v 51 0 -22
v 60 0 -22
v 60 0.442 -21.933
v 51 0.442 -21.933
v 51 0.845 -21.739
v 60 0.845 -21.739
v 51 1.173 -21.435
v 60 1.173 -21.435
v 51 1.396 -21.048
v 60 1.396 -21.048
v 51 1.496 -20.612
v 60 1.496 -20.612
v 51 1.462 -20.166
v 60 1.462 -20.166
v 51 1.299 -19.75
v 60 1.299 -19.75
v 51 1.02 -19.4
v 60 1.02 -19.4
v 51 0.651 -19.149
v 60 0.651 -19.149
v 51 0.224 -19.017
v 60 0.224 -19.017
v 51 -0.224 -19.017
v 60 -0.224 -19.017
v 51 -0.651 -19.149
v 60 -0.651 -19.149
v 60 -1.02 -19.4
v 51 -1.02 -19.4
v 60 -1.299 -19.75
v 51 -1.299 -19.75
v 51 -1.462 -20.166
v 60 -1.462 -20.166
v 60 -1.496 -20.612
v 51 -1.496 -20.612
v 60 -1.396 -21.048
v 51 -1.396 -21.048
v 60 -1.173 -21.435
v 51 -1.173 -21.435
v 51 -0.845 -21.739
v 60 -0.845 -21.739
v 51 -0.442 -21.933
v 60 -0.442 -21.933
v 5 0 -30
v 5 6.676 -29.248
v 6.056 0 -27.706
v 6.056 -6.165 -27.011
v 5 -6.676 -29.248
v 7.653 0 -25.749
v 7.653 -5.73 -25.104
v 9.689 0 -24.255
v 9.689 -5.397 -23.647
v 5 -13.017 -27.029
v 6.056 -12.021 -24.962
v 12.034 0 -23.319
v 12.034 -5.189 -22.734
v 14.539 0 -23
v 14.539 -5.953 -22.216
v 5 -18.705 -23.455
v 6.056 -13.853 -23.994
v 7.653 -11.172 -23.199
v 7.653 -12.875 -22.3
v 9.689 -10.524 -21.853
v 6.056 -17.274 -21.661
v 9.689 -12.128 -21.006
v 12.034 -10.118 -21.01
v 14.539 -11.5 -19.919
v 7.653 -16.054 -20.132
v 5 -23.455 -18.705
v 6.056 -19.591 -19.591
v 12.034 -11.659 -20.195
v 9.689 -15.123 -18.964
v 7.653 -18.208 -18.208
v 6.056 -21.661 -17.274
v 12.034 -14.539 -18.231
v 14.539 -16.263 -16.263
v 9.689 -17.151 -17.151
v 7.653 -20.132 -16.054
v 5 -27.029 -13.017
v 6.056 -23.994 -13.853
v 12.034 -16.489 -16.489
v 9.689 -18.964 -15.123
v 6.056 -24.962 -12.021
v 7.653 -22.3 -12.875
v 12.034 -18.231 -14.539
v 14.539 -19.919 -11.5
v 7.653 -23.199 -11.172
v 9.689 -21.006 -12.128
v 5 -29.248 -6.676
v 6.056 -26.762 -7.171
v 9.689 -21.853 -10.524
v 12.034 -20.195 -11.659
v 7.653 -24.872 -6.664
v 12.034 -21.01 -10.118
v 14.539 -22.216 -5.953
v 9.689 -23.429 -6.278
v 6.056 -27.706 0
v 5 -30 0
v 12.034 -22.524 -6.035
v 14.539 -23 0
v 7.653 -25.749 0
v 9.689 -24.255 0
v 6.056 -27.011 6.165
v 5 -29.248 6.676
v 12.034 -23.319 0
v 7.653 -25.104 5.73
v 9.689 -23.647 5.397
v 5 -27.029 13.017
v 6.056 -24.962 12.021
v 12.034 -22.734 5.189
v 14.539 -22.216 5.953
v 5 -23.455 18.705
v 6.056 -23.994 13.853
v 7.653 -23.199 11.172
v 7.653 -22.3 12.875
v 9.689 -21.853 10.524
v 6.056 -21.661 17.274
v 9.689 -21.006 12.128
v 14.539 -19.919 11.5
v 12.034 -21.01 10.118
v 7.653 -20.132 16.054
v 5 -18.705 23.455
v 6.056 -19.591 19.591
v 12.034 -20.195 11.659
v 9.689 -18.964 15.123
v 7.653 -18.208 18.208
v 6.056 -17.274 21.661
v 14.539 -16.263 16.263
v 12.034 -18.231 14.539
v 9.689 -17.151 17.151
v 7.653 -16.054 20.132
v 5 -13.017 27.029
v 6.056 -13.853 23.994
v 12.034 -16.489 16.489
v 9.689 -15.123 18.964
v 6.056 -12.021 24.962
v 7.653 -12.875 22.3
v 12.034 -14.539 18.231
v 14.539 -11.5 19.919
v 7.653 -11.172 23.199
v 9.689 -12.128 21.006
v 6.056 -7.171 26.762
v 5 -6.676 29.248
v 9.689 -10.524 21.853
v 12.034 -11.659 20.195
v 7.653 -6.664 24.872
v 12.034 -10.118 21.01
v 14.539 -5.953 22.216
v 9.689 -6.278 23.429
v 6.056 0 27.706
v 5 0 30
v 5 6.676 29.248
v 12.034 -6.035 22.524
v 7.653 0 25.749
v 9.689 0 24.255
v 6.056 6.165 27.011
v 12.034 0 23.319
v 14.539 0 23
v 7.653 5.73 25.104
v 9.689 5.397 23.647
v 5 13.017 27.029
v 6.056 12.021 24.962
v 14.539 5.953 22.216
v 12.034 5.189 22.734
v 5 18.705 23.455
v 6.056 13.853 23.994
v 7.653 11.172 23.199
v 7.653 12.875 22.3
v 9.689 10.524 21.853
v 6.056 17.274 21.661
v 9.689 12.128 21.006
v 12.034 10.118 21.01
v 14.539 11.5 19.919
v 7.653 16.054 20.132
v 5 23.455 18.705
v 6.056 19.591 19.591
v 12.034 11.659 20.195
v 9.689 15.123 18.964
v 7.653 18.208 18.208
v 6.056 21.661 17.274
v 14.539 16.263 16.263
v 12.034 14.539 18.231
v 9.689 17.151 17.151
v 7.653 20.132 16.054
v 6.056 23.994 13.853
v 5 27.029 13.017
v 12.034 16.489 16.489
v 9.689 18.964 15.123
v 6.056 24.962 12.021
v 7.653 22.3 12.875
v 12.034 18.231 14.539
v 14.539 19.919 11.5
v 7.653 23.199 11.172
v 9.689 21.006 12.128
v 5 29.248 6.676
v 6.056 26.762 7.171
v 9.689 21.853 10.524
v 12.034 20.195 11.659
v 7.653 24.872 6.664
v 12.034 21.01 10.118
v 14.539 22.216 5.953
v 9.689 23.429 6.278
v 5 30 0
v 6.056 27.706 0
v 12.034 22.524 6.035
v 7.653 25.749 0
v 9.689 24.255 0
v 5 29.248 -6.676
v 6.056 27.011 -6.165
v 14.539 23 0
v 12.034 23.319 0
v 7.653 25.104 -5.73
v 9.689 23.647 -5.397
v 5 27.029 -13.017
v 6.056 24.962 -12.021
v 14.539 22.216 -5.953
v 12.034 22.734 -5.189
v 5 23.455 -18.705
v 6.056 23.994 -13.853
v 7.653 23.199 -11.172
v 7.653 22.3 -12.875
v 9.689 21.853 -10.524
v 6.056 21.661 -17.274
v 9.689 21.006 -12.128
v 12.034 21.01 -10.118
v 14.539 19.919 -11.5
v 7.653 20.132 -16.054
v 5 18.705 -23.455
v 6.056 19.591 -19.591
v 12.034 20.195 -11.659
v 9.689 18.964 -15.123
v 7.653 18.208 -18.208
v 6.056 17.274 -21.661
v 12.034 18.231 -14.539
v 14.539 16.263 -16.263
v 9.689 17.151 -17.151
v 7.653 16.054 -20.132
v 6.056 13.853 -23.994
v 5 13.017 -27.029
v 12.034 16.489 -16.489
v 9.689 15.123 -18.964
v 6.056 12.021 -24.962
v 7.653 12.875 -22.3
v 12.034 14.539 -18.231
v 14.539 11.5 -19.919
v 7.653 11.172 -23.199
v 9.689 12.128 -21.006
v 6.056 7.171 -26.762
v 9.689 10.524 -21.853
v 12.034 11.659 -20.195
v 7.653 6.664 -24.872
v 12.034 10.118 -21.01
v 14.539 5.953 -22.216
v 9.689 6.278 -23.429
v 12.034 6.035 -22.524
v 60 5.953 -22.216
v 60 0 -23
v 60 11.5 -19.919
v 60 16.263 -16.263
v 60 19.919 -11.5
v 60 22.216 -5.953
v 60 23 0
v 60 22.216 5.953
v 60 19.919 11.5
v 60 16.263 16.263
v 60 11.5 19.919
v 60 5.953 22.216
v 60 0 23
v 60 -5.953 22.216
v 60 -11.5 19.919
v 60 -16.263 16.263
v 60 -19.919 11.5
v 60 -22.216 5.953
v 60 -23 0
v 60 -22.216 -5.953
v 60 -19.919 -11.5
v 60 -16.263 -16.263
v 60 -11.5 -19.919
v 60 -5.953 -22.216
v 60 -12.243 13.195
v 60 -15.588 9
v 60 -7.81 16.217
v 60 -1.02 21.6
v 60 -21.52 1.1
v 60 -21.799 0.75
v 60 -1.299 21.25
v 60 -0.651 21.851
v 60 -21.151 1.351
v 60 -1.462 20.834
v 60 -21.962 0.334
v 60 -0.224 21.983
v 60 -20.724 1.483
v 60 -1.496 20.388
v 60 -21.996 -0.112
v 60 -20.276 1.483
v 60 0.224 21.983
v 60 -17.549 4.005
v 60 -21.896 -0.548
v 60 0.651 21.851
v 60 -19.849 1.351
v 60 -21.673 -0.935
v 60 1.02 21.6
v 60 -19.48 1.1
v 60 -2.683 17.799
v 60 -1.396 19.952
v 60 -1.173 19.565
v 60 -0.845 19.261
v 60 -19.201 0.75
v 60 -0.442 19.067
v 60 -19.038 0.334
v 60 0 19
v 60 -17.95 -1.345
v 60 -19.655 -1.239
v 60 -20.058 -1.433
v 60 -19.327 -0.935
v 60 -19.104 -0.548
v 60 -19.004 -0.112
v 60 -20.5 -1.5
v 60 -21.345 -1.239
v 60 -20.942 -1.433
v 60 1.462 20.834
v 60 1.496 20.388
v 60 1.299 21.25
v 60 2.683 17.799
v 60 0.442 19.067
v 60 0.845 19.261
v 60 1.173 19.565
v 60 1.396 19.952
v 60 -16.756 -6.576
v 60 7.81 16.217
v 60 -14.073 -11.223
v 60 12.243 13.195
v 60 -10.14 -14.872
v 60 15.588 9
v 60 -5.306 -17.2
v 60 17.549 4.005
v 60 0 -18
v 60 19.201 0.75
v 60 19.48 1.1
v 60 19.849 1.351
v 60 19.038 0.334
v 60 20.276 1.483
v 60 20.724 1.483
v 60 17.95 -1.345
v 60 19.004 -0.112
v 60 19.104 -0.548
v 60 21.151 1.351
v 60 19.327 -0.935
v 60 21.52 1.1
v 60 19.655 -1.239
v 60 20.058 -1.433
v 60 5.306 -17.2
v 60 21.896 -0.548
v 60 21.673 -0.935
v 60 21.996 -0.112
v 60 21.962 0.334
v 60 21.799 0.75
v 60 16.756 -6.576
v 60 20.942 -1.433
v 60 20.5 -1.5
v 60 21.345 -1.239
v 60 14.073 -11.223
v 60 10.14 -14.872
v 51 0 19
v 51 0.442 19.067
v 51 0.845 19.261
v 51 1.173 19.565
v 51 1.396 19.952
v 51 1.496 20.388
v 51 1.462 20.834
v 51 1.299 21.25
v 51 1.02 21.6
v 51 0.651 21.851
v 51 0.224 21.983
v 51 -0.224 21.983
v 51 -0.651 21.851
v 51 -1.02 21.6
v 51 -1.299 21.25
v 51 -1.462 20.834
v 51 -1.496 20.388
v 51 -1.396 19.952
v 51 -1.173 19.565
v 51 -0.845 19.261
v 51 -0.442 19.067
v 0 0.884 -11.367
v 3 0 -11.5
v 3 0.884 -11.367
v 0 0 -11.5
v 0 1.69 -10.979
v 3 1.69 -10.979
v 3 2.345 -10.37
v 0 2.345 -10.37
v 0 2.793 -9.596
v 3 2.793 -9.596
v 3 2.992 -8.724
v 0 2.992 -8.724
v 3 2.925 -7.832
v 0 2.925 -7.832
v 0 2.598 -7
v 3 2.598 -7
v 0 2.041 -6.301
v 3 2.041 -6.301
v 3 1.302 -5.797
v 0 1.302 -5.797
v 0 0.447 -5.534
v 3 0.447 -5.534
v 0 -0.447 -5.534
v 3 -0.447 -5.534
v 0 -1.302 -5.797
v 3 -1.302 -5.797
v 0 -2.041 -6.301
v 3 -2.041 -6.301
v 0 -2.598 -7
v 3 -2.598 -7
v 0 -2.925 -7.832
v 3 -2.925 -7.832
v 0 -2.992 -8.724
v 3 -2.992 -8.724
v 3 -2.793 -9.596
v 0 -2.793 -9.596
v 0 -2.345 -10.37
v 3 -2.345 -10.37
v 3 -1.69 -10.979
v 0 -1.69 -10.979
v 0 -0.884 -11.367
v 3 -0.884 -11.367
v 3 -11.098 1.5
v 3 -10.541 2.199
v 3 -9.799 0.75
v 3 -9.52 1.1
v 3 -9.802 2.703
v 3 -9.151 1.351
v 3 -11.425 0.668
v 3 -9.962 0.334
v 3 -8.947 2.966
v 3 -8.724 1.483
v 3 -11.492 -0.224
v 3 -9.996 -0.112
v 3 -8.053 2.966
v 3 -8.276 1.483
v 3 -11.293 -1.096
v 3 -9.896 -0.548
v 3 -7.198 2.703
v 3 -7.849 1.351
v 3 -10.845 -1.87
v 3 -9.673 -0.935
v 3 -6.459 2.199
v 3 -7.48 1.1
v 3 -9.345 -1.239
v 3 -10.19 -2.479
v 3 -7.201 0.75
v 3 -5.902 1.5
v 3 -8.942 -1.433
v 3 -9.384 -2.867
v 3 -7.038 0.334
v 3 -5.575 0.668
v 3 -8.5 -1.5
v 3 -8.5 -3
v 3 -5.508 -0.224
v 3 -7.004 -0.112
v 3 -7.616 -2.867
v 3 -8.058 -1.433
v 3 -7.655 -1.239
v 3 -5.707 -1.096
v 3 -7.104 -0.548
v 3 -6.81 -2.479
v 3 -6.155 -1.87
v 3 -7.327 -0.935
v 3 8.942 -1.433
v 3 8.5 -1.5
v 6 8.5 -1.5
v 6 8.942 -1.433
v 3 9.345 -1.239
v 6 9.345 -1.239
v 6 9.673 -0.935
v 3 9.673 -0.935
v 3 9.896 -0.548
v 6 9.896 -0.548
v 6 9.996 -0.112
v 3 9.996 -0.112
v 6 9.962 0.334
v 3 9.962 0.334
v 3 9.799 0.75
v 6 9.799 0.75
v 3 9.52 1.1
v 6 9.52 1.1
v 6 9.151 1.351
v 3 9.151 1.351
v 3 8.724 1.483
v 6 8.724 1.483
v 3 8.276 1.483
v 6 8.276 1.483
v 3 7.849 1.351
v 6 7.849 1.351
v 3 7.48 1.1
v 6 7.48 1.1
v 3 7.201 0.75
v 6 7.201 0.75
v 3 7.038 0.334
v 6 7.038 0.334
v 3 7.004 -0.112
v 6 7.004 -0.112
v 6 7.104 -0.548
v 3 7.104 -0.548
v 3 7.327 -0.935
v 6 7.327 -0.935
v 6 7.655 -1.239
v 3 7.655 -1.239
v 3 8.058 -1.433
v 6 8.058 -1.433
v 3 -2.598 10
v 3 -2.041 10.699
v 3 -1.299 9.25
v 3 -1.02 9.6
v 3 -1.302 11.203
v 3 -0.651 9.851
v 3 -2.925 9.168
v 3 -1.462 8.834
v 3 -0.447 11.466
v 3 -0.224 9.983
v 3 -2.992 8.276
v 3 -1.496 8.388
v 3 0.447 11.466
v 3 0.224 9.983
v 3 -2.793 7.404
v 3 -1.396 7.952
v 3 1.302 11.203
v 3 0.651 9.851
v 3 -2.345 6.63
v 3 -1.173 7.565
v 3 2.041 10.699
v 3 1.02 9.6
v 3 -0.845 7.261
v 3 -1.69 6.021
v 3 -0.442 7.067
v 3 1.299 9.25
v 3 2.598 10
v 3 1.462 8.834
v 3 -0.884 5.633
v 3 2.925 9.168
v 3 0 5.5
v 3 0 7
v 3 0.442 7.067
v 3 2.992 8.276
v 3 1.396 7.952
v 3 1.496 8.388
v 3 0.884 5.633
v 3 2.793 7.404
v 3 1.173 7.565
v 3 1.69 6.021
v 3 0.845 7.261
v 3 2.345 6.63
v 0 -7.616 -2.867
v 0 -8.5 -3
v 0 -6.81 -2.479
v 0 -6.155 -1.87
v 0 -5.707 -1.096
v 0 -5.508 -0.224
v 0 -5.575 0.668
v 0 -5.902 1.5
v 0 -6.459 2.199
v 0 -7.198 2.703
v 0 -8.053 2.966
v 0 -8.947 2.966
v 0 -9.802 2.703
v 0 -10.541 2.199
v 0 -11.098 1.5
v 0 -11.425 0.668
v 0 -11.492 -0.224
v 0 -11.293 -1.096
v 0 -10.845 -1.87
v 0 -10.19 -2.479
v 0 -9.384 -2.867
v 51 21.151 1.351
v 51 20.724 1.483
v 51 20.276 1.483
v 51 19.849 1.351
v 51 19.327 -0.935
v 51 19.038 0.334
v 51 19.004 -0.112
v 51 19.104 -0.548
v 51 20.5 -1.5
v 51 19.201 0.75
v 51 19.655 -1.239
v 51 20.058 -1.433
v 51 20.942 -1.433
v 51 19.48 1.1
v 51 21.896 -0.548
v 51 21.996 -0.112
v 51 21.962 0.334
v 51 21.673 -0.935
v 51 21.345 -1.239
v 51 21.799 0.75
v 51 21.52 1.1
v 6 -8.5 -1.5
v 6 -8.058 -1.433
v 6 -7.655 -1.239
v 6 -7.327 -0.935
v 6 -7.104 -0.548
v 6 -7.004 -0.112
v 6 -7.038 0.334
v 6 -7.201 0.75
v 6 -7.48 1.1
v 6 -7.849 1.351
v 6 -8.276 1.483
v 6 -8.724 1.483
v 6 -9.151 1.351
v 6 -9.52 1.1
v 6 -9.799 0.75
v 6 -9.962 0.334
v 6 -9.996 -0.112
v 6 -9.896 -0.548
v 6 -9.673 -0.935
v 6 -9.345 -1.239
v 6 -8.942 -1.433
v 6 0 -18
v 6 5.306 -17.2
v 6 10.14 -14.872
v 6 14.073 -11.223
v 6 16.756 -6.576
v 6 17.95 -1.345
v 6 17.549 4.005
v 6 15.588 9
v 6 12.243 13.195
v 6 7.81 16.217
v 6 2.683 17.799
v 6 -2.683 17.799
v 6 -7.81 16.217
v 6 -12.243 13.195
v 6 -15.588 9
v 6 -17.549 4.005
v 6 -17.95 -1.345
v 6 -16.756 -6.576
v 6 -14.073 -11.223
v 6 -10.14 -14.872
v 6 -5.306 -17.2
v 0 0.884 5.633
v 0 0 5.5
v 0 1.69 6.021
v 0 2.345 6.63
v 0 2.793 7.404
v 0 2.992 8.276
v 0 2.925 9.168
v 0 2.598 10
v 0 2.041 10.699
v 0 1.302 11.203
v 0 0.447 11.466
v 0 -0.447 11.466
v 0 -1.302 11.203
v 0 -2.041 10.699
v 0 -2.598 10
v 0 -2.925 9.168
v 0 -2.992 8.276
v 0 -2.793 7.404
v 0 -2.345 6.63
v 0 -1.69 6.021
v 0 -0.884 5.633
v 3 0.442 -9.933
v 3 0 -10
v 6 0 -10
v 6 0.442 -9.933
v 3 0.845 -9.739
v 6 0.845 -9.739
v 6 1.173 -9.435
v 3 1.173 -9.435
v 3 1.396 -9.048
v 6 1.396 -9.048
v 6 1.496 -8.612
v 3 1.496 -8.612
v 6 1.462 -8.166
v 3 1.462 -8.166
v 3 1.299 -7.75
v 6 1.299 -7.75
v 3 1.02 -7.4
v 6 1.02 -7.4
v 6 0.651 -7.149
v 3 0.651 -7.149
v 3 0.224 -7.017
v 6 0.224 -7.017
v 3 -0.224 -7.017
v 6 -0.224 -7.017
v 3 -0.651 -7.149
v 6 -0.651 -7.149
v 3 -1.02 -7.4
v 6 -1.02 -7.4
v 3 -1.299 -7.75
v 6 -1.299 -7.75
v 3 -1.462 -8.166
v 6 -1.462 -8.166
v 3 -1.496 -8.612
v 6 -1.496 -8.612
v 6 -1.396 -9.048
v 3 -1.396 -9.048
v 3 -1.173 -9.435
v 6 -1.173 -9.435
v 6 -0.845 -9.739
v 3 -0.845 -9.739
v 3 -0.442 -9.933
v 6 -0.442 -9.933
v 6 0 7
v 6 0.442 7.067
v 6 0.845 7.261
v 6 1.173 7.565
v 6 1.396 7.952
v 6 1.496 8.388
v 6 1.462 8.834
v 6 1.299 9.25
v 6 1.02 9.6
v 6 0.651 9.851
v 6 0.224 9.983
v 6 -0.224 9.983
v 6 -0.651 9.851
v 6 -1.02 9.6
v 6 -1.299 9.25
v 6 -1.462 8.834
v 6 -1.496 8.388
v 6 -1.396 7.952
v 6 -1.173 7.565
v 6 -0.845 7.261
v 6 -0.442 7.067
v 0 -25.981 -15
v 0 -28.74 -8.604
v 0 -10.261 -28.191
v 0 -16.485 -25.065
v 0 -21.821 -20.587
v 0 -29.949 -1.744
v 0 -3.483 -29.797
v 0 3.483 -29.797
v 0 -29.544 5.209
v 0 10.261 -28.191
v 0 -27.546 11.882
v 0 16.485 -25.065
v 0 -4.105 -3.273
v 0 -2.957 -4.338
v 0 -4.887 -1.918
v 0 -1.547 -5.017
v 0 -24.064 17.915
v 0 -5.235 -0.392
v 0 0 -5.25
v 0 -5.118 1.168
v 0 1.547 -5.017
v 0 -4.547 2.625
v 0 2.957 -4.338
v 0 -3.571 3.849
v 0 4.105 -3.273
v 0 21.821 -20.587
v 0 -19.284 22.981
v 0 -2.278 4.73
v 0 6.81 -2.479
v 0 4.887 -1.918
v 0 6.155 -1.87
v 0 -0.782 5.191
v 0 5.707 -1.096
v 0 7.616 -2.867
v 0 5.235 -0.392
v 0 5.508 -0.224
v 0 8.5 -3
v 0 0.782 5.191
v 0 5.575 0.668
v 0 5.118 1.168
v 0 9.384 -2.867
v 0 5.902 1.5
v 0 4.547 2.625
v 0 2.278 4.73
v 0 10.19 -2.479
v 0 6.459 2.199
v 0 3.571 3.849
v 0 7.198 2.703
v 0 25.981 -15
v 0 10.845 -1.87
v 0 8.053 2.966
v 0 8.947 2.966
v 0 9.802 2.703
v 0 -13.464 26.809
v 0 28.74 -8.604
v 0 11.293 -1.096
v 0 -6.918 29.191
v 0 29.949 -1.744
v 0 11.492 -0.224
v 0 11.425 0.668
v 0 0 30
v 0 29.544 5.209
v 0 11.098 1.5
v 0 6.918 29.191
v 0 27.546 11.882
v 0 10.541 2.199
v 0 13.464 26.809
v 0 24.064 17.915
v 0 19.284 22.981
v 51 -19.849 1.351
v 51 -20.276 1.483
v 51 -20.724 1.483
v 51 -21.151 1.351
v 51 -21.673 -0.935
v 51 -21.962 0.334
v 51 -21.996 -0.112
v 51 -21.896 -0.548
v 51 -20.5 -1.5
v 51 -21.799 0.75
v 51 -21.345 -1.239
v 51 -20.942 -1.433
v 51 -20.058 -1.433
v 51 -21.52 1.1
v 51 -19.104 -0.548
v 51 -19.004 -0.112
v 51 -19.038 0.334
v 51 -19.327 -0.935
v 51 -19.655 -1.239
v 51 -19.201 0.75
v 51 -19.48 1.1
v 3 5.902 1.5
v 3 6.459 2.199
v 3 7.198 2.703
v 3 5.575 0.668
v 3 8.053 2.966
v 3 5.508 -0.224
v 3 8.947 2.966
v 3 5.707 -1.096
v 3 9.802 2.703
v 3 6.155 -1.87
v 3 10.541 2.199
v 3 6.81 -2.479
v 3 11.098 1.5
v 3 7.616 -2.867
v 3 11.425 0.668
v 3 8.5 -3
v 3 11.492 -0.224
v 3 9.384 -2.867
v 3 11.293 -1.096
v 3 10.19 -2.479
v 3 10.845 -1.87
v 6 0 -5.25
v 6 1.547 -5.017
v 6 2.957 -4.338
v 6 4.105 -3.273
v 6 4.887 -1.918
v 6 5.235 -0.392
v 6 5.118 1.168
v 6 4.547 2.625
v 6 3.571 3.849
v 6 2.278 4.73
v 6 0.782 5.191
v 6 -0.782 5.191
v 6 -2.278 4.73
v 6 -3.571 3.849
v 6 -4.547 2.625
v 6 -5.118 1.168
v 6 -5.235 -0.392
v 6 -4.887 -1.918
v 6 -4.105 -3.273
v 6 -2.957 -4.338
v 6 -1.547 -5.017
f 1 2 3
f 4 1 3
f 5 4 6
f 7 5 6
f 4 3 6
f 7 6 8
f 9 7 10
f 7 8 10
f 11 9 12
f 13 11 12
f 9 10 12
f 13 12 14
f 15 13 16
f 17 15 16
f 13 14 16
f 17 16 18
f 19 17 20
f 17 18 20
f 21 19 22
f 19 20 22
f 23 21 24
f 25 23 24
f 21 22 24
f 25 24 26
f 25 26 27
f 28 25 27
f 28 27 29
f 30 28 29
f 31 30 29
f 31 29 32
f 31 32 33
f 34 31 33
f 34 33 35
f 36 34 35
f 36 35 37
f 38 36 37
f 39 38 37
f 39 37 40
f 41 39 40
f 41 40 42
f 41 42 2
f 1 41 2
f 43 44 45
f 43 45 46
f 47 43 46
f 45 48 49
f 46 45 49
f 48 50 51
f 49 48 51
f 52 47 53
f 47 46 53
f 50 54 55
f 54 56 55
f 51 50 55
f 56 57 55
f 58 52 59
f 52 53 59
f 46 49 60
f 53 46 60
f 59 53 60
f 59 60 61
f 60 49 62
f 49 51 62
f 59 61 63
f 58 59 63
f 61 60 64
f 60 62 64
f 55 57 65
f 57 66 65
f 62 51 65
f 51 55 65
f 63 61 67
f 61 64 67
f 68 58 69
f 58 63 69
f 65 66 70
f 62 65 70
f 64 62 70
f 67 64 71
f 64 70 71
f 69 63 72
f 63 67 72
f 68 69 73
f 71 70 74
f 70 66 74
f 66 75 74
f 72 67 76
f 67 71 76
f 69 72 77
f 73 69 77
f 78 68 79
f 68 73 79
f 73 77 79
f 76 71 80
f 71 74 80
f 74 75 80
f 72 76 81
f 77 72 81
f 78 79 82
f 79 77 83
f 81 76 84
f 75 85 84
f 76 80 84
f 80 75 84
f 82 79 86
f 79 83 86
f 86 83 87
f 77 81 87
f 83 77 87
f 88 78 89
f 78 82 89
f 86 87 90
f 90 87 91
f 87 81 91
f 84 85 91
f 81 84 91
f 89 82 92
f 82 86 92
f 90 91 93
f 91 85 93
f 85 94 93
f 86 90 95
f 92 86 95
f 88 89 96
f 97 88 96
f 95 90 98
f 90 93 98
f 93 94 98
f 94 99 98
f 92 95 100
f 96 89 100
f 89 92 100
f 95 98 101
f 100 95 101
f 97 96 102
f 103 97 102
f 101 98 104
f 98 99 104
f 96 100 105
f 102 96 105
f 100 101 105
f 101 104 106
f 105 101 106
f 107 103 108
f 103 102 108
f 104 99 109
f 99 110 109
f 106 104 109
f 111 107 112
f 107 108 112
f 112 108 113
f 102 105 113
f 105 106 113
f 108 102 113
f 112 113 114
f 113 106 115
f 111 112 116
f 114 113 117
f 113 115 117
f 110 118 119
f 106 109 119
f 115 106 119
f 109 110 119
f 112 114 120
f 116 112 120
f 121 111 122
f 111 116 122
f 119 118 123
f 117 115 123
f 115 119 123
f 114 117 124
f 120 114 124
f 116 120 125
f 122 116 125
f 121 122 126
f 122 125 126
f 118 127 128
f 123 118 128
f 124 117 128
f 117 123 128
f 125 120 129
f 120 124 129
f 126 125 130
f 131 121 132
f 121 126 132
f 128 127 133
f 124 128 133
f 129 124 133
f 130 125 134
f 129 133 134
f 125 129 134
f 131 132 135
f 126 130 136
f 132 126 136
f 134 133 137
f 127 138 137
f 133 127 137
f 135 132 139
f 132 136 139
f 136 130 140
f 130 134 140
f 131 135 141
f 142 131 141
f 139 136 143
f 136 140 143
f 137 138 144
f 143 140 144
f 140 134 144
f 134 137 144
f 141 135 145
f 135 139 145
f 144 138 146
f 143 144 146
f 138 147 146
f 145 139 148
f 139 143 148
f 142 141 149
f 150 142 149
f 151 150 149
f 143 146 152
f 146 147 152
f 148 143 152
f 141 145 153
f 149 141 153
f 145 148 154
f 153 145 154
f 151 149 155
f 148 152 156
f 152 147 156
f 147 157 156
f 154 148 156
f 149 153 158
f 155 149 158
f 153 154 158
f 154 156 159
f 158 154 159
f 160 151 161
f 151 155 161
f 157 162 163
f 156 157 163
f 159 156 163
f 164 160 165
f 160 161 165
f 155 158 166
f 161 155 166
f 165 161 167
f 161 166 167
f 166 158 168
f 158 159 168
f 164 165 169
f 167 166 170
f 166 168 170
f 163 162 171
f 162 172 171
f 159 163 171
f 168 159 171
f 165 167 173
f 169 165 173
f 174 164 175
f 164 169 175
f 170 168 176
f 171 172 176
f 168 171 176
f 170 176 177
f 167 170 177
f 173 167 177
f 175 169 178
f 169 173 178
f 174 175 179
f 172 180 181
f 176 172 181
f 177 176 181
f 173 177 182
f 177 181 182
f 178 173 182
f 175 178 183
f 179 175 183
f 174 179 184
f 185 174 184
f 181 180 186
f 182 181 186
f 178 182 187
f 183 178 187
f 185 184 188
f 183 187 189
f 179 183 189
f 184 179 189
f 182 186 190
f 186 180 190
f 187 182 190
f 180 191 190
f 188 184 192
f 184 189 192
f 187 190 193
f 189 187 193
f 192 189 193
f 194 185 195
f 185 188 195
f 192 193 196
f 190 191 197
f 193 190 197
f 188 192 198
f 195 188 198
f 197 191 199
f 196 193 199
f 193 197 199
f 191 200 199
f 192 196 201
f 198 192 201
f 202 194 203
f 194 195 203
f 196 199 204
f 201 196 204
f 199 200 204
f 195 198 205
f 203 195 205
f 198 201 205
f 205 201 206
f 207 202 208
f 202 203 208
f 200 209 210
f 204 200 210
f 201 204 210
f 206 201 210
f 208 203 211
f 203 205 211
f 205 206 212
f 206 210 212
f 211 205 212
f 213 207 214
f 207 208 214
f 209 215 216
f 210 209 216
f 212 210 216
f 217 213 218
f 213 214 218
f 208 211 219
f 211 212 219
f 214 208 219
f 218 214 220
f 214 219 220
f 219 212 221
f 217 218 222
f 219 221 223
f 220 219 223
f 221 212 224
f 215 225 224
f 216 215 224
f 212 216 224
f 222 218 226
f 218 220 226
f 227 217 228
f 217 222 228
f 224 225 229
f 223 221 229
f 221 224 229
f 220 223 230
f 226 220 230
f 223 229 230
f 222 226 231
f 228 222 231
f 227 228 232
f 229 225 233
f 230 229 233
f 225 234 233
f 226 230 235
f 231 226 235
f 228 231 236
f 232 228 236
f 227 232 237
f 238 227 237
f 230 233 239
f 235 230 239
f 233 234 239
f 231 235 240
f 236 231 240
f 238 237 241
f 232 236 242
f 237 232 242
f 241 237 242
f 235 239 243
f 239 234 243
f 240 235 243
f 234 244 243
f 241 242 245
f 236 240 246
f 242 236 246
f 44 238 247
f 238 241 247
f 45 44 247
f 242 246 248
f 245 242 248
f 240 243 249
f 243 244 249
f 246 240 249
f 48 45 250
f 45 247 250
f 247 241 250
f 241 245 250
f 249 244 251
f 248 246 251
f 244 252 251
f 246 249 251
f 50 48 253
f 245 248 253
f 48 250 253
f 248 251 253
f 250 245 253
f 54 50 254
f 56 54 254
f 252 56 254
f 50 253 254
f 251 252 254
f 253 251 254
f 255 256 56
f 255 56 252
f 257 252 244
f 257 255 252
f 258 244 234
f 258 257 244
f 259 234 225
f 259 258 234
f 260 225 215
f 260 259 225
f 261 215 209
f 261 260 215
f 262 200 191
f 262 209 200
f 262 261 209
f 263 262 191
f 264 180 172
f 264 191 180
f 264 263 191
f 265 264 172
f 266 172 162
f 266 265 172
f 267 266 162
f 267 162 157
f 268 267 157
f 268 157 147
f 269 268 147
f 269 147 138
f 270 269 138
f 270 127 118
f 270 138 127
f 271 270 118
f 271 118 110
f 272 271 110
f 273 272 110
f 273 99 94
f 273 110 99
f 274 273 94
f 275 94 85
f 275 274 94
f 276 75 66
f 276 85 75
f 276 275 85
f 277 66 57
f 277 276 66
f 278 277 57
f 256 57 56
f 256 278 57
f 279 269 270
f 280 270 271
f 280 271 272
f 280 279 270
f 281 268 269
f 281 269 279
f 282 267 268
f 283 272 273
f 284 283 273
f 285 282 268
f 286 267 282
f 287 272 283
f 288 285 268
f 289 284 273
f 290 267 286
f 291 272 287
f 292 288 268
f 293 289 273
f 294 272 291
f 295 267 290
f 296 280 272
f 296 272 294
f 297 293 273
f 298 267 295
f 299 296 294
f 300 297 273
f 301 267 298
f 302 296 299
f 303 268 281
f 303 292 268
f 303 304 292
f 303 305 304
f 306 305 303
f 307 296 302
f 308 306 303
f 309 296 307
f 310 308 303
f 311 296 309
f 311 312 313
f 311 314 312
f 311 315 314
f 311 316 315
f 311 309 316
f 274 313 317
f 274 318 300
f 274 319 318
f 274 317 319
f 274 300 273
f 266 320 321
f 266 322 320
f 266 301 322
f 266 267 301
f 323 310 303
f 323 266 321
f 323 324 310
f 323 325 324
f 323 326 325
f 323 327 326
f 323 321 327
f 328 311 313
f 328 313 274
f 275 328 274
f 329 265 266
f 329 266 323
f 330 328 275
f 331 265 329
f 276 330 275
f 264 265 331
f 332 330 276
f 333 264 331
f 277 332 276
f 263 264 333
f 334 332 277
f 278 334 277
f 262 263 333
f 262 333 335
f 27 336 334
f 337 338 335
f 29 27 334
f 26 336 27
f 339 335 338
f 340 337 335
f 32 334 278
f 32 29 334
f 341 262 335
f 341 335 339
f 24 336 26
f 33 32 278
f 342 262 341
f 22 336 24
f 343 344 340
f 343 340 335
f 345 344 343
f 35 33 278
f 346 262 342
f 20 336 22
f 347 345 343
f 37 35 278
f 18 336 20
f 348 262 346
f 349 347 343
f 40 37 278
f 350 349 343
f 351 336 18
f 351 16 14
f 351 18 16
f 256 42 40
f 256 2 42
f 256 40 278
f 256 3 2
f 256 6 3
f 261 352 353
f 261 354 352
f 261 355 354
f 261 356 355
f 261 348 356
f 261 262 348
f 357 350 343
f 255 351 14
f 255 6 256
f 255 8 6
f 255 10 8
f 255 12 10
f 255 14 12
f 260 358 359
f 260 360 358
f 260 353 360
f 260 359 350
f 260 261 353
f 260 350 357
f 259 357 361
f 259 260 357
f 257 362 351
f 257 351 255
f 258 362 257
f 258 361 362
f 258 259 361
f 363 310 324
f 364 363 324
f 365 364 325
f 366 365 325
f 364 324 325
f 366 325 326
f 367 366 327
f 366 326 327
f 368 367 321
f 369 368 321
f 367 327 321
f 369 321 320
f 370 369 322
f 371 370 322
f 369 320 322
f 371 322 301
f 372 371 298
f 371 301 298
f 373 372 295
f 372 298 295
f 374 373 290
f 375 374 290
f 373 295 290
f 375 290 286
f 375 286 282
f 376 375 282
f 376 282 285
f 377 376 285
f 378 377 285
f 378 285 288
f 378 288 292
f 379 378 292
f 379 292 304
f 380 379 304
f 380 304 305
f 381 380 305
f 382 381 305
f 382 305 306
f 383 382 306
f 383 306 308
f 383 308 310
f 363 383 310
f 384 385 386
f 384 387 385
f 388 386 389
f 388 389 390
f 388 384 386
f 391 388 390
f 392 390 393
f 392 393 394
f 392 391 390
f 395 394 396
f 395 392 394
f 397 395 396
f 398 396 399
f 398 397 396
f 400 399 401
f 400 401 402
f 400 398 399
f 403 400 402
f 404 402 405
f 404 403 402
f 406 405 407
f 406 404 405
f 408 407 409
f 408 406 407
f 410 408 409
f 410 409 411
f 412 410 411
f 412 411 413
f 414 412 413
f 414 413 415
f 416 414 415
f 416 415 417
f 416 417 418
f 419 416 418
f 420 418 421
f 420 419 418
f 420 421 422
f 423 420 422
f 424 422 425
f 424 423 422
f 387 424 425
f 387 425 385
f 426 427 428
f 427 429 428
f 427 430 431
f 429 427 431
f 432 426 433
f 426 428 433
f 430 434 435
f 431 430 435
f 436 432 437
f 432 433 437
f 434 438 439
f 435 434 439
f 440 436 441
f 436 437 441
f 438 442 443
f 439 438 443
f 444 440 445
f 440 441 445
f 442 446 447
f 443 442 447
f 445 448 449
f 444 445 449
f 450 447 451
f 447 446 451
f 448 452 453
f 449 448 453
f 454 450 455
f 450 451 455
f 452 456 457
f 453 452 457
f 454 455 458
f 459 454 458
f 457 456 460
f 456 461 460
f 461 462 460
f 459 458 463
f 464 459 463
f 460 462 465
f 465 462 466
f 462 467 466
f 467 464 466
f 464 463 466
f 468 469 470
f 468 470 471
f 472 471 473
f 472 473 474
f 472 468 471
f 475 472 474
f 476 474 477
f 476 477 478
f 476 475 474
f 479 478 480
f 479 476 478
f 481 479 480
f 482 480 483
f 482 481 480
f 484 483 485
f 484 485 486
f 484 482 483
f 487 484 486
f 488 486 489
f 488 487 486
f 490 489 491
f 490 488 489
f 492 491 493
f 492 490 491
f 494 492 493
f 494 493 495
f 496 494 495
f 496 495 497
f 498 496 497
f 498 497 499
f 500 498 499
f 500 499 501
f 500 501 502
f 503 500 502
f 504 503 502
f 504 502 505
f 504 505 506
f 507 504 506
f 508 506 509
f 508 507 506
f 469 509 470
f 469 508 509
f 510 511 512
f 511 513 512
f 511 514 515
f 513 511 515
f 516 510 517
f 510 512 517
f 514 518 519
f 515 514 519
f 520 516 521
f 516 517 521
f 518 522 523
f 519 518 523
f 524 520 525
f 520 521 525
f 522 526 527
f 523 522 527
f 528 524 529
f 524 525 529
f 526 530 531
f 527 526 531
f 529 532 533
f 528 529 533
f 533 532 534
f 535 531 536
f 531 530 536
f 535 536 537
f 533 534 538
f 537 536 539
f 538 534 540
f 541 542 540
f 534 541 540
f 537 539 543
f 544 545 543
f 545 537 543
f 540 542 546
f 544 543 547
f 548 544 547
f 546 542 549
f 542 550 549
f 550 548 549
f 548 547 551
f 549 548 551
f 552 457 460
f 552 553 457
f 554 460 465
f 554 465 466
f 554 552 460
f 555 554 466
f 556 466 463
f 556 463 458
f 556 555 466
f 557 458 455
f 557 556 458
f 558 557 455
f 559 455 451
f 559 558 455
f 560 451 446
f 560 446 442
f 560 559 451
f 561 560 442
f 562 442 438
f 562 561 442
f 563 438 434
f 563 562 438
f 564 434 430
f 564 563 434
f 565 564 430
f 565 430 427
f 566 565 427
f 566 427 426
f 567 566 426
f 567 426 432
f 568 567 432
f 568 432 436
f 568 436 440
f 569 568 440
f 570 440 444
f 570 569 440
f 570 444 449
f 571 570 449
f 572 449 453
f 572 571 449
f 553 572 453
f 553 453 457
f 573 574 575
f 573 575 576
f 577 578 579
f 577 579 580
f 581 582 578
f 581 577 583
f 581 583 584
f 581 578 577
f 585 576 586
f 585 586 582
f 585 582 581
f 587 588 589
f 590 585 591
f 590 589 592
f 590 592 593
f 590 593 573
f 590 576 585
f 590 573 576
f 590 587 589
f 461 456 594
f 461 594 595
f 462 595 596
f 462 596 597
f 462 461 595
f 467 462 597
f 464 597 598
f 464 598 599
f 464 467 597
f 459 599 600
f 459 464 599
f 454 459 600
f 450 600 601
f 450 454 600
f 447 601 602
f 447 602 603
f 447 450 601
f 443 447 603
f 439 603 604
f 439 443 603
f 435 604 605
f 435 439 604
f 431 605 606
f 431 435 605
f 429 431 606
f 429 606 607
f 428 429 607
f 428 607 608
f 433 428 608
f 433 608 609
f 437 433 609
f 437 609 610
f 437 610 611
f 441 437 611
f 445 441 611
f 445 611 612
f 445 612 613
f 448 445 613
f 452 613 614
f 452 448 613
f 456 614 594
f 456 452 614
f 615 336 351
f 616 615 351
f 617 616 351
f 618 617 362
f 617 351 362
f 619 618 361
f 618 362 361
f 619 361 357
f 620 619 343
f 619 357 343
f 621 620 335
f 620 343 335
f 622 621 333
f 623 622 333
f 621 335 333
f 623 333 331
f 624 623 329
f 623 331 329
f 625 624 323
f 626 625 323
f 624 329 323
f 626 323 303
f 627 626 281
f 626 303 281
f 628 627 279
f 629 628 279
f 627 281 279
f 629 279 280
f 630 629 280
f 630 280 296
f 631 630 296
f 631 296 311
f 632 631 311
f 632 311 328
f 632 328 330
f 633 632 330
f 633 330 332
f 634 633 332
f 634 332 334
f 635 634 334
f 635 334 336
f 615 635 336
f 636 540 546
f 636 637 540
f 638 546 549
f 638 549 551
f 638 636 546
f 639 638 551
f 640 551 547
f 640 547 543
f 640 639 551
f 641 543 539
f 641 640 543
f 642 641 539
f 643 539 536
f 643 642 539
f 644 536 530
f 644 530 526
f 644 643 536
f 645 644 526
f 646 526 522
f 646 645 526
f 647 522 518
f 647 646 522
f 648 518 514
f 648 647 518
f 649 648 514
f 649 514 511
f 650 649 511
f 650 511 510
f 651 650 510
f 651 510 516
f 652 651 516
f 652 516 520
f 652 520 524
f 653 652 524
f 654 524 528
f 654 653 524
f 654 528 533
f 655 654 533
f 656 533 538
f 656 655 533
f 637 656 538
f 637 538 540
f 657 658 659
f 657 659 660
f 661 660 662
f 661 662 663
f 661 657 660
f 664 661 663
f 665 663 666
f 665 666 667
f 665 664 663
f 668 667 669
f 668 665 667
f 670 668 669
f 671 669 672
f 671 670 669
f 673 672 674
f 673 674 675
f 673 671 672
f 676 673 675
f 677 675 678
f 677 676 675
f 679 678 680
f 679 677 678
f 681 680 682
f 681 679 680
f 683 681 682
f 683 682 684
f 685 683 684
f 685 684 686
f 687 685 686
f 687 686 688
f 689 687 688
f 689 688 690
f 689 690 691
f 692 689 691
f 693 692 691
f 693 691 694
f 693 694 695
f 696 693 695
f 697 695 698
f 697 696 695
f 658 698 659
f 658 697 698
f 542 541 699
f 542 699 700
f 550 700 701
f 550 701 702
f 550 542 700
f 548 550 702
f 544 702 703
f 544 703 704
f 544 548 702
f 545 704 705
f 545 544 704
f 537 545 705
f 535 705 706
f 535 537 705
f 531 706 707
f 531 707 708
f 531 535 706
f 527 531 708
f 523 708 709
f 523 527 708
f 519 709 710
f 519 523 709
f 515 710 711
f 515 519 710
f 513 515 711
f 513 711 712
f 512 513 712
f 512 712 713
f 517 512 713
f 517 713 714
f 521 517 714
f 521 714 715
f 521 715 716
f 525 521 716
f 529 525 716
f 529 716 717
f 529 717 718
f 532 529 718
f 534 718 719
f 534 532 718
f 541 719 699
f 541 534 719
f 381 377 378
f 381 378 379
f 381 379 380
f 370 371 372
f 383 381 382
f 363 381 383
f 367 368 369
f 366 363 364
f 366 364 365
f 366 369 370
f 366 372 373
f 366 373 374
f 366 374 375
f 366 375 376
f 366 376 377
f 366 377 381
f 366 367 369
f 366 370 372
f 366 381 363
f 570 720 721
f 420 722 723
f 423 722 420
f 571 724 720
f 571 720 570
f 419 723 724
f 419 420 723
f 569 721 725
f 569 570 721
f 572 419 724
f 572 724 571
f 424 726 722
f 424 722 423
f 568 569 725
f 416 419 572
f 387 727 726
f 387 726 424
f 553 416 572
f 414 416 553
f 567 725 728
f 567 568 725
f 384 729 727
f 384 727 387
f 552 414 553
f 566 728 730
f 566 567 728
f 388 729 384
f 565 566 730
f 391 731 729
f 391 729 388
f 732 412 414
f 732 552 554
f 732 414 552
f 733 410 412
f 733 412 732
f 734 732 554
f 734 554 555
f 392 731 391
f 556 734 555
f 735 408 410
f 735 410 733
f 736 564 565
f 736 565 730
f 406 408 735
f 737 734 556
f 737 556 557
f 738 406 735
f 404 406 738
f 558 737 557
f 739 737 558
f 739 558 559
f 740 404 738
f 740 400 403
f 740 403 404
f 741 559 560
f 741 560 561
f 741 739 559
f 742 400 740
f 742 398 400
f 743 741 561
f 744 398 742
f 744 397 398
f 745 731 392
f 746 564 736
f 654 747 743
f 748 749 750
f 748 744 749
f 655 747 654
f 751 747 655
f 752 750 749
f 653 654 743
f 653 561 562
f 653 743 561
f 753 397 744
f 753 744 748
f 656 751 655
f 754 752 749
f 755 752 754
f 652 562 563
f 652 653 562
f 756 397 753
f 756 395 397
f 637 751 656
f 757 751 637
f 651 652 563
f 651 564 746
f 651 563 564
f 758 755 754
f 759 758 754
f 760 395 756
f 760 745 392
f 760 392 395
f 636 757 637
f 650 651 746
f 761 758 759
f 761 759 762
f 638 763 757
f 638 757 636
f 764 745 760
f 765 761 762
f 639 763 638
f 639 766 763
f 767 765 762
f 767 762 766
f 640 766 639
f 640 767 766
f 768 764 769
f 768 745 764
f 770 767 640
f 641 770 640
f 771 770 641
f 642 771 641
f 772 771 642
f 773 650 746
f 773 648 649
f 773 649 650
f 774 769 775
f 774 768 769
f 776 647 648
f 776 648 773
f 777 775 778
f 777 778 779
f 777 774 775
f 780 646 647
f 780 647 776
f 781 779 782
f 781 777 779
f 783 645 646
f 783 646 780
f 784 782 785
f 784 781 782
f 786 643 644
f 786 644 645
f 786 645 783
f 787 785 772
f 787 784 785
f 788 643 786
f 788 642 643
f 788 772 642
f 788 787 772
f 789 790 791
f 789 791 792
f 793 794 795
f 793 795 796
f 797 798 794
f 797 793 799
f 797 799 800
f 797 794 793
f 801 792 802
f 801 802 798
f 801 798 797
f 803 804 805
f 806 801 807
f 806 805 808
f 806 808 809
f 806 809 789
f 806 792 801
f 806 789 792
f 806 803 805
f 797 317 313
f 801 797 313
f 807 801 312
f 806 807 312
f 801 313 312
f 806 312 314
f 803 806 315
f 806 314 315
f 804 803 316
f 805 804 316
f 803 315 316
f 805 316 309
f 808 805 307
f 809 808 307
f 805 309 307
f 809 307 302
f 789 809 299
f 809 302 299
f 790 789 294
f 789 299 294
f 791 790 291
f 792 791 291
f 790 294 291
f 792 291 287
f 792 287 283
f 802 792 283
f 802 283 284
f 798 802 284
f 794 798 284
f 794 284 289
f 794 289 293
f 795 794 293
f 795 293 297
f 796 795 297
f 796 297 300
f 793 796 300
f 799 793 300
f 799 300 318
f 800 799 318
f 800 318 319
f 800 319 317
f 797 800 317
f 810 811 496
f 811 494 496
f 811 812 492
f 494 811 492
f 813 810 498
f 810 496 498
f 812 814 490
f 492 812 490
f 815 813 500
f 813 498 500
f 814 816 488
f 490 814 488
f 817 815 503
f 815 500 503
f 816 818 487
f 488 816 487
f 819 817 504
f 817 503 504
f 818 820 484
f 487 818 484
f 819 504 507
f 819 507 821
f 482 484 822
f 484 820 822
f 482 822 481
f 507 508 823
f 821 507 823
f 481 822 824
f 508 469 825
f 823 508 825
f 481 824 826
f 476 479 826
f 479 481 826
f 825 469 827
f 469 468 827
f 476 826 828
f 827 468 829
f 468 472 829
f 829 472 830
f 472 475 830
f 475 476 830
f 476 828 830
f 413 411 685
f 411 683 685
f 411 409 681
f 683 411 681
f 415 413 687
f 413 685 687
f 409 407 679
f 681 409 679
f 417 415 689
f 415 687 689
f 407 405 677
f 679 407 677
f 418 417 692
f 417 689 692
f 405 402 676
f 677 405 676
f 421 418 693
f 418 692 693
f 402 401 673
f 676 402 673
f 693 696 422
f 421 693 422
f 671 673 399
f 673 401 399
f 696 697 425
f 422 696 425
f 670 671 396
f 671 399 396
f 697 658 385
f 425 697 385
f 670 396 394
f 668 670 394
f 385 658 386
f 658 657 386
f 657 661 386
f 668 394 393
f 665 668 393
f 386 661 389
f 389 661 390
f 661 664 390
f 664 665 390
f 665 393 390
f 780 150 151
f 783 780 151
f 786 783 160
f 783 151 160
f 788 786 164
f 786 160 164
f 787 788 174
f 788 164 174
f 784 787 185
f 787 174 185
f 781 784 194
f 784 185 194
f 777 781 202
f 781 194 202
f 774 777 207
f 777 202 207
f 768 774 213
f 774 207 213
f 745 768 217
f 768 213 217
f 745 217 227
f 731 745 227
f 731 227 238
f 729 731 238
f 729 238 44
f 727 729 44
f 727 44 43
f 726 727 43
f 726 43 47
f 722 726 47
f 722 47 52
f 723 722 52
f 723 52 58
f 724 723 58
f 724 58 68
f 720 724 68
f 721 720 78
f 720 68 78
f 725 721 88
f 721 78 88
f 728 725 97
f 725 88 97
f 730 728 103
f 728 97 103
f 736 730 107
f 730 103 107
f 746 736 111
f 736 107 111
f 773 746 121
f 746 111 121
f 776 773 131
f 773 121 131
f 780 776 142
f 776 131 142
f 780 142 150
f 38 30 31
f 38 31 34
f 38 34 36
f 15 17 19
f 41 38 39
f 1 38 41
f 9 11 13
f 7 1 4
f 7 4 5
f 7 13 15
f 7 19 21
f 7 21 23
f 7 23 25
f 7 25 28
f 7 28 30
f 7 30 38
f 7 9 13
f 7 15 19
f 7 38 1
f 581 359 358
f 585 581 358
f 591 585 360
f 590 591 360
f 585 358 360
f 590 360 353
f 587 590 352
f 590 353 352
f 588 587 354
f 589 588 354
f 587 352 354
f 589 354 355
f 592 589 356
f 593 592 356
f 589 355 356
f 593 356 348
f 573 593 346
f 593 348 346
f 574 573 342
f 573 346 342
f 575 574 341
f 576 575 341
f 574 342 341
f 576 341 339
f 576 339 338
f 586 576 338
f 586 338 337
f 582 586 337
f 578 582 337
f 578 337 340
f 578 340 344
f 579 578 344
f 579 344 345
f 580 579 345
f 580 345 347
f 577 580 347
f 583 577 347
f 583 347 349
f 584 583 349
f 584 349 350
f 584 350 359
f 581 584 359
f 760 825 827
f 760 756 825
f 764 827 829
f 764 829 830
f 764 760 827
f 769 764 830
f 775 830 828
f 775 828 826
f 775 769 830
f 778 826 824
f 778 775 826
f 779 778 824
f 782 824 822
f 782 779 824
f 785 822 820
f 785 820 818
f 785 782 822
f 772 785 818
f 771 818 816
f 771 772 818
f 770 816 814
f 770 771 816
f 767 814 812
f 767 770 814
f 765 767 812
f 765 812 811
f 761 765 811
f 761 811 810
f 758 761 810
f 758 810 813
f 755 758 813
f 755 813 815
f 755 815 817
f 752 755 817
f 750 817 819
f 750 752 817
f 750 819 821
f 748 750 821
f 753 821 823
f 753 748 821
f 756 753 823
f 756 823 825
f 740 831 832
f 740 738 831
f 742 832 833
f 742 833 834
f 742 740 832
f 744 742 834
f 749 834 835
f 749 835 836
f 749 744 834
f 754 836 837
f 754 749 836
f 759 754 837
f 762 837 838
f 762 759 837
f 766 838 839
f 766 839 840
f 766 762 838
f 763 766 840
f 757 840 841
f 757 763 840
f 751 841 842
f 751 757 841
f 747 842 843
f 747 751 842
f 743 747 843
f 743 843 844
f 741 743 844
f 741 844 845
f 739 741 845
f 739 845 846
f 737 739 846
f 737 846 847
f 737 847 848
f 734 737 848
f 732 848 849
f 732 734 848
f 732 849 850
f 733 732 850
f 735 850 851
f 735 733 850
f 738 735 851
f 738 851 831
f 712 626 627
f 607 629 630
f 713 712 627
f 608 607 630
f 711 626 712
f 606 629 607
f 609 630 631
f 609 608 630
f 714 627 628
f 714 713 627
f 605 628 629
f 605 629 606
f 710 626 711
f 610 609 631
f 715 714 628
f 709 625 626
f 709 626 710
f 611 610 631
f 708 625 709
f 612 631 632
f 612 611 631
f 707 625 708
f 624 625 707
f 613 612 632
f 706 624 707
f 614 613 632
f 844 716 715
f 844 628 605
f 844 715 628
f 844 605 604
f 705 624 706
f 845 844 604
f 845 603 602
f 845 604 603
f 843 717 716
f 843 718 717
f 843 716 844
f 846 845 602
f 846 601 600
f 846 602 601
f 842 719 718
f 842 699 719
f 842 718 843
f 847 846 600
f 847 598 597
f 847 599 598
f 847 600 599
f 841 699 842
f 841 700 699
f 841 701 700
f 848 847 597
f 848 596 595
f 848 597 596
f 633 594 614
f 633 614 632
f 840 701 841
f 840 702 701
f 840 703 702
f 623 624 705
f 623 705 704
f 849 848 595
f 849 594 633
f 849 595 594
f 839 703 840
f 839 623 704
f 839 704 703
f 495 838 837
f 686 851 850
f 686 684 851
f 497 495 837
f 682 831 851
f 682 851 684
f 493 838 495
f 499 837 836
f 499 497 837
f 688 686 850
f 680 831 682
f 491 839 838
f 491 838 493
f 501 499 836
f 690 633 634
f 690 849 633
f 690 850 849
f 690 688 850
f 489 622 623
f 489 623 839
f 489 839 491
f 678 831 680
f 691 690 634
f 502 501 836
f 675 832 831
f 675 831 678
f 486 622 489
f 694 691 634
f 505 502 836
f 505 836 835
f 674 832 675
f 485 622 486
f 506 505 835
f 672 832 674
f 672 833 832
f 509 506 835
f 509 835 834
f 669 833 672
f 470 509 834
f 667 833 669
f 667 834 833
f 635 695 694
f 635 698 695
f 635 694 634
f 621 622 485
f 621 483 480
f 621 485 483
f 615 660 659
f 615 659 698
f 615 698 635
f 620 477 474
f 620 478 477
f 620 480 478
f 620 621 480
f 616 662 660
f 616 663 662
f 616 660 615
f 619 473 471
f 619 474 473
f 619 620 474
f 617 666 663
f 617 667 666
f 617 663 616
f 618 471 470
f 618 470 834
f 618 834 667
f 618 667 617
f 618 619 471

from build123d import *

# Parameters (mm, degrees)
SKETCH1_R                 = 23
SKETCH1_R_2               = 18
BOSS_EXTRUDE1_DEPTH       = 11
BOSS_EXTRUDE2_START       = 3
SKETCH1_13_R              = 23
SKETCH1_13_R_2            = 18
SKETCH1_13_R_3            = 3
SKETCH1_13_R_4            = 5.25
BOSS_EXTRUDE2_DEPTH       = 3
BOSS_EXTRUDE4_START       = 3
BOSS_EXTRUDE4_OUTLINE_R   = 23
BOSS_EXTRUDE4_OUTLINE_R_2 = 3
BOSS_EXTRUDE4_OUTLINE_R_3 = 5.25
BOSS_EXTRUDE4_DEPTH       = 3
BOSS_EXTRUDE5_START       = 60
SKETCH1_17_R              = 23
SKETCH1_17_R_2            = 18
BOSS_EXTRUDE5_DEPTH       = 60
SKETCH2_R                 = 1.5
CUT_EXTRUDE1_DEPTH        = 5
BOSS_EXTRUDE6_START       = 3
SKETCH1_20_R              = 3
SKETCH1_20_R_2            = 1.5
BOSS_EXTRUDE6_DEPTH       = 3
SKETCH1_21_R              = 23
SKETCH1_21_R_2            = 18
CUT_EXTRUDE4_DEPTH        = 23
SKETCH2_2_R               = 1.5
CUT_EXTRUDE5_DEPTH        = 9
BOSS_EXTRUDE7_START       = -5
SKETCH3_R                 = 30
SKETCH3_R_2               = 23
BOSS_EXTRUDE7_DEPTH       = 5
FILLET1_R                 = 10


# Read off the part's stored shape, not the designer's step: Boss-Extrude4
with BuildPart() as part:
    # Sketch1 → Boss-Extrude1 (new body)
    with BuildSketch(Plane(origin=(0, 0, 0), x_dir=(0, 0, -1), z_dir=(1, 0, 0))):
        Circle(SKETCH1_R)
        Circle(SKETCH1_R_2, mode=Mode.SUBTRACT)
    extrude(amount=-BOSS_EXTRUDE1_DEPTH)

    # Sketch1<13> → Boss-Extrude2 (add)
    # profile 1 of 2: a face of its own
    with BuildSketch(Plane(origin=(0, 0, 0), x_dir=(0, 0, -1), z_dir=(1, 0, 0)).offset(BOSS_EXTRUDE2_START)):
        Circle(SKETCH1_13_R)
        Circle(SKETCH1_13_R_2, mode=Mode.SUBTRACT)
    # profile 2 of 2: a face of its own
    with BuildSketch(Plane(origin=(0, 0, 0), x_dir=(0, 0, -1), z_dir=(1, 0, 0)).offset(BOSS_EXTRUDE2_START)):
        Circle(SKETCH1_13_R_2)
        with Locations((-8.5, 0)):
            Circle(SKETCH1_13_R_3, mode=Mode.SUBTRACT)
        with Locations((8.5, 0)):
            Circle(SKETCH1_13_R_3, mode=Mode.SUBTRACT)
        Circle(SKETCH1_13_R_4, mode=Mode.SUBTRACT)
        with Locations((0, -8.5)):
            Circle(SKETCH1_13_R_3, mode=Mode.SUBTRACT)
        with Locations((0, 8.5)):
            Circle(SKETCH1_13_R_3, mode=Mode.SUBTRACT)
    extrude(amount=-BOSS_EXTRUDE2_DEPTH)

    # Boss-Extrude4 outline → Boss-Extrude4 (add)
    with BuildSketch(Plane(origin=(0, 0, 0), x_dir=(0, 0, -1), z_dir=(1, 0, 0)).offset(BOSS_EXTRUDE4_START)):
        Circle(BOSS_EXTRUDE4_OUTLINE_R)
        with Locations((0, -8.5)):
            Circle(BOSS_EXTRUDE4_OUTLINE_R_2, mode=Mode.SUBTRACT)
        with Locations((-8.5, 0)):
            Circle(BOSS_EXTRUDE4_OUTLINE_R_2, mode=Mode.SUBTRACT)
        Circle(BOSS_EXTRUDE4_OUTLINE_R_3, mode=Mode.SUBTRACT)
        with Locations((8.5, 0)):
            Circle(BOSS_EXTRUDE4_OUTLINE_R_2, mode=Mode.SUBTRACT)
        with Locations((0, 8.5)):
            Circle(BOSS_EXTRUDE4_OUTLINE_R_2, mode=Mode.SUBTRACT)
    extrude(amount=BOSS_EXTRUDE4_DEPTH)

    # Sketch1<17> → Boss-Extrude5 (add)
    with BuildSketch(Plane(origin=(0, 0, 0), x_dir=(0, 0, -1), z_dir=(1, 0, 0)).offset(BOSS_EXTRUDE5_START)):
        Circle(SKETCH1_17_R)
        Circle(SKETCH1_17_R_2, mode=Mode.SUBTRACT)
    extrude(amount=-BOSS_EXTRUDE5_DEPTH)

    # Sketch2 → Cut-Extrude1 (cut)
    with BuildSketch(Plane(origin=(60, 0, 0), x_dir=(0, 0, -1), z_dir=(1, 0, 0))):
        with Locations((0, 20.5)):
            Circle(SKETCH2_R)
        with Locations((20.5, 0)):
            Circle(SKETCH2_R)
        with Locations((0, -20.5)):
            Circle(SKETCH2_R)
        with Locations((-20.5, 0)):
            Circle(SKETCH2_R)
    extrude(amount=-CUT_EXTRUDE1_DEPTH, mode=Mode.SUBTRACT)

    # Sketch1<20> → Boss-Extrude6 (add)
    # profile 1 of 4: a face of its own
    with BuildSketch(Plane(origin=(0, 0, 0), x_dir=(0, 0, -1), z_dir=(1, 0, 0)).offset(BOSS_EXTRUDE6_START)):
        with Locations((0, 8.5)):
            Circle(SKETCH1_20_R)
        with Locations((0, 8.5)):
            Circle(SKETCH1_20_R_2, mode=Mode.SUBTRACT)
    # profile 2 of 4: a face of its own
    with BuildSketch(Plane(origin=(0, 0, 0), x_dir=(0, 0, -1), z_dir=(1, 0, 0)).offset(BOSS_EXTRUDE6_START)):
        with Locations((-8.5, 0)):
            Circle(SKETCH1_20_R)
        with Locations((-8.5, 0)):
            Circle(SKETCH1_20_R_2, mode=Mode.SUBTRACT)
    # profile 3 of 4: a face of its own
    with BuildSketch(Plane(origin=(0, 0, 0), x_dir=(0, 0, -1), z_dir=(1, 0, 0)).offset(BOSS_EXTRUDE6_START)):
        with Locations((0, -8.5)):
            Circle(SKETCH1_20_R)
        with Locations((0, -8.5)):
            Circle(SKETCH1_20_R_2, mode=Mode.SUBTRACT)
    # profile 4 of 4: a face of its own
    with BuildSketch(Plane(origin=(0, 0, 0), x_dir=(0, 0, -1), z_dir=(1, 0, 0)).offset(BOSS_EXTRUDE6_START)):
        with Locations((8.5, 0)):
            Circle(SKETCH1_20_R)
        with Locations((8.5, 0)):
            Circle(SKETCH1_20_R_2, mode=Mode.SUBTRACT)
    extrude(amount=BOSS_EXTRUDE6_DEPTH)

    # Sketch1<21> → Cut-Extrude4 (cut)
    with BuildSketch(Plane(origin=(0, 0, 0), x_dir=(0, 0, -1), z_dir=(1, 0, 0))):
        Circle(SKETCH1_21_R)
        Circle(SKETCH1_21_R_2, mode=Mode.SUBTRACT)
    extrude(amount=-CUT_EXTRUDE4_DEPTH, mode=Mode.SUBTRACT)

    # Sketch2<2> → Cut-Extrude5 (cut)
    with BuildSketch(Plane(origin=(60, 0, 0), x_dir=(0, 0, -1), z_dir=(1, 0, 0))):
        with Locations((0, 20.5)):
            Circle(SKETCH2_2_R)
        with Locations((20.5, 0)):
            Circle(SKETCH2_2_R)
        with Locations((0, -20.5)):
            Circle(SKETCH2_2_R)
        with Locations((-20.5, 0)):
            Circle(SKETCH2_2_R)
    extrude(amount=-CUT_EXTRUDE5_DEPTH, mode=Mode.SUBTRACT)

    # Sketch3 → Boss-Extrude7 (add)
    with BuildSketch(Plane.ZY.offset(BOSS_EXTRUDE7_START)):
        Circle(SKETCH3_R)
        with Locations(Location((0, 0, 0), (0, 0, 180))):
            Circle(SKETCH3_R_2, mode=Mode.SUBTRACT)
    extrude(amount=BOSS_EXTRUDE7_DEPTH)

    # Fillet1
    # the kernel refuses this fillet: 10 mm, written as the material it adds along each edge
    with BuildSketch(Plane(origin=(5, 0, 0), x_dir=(0, 0, -1), z_dir=(0, 1, 0))) as fillet1_piece_1:
        with BuildLine():
            CenterArc((33, -9.539392014), FILLET1_R, 107.457603124, 72.542396876)
            Line((30, 0), (29.94, 0.19078784))
            ThreePointArc((29.94, 0.19078784), (26.5, 0.2), (23, 0.2))
            Line((23, 0.2), (22.8, 0))
            Line((22.8, 0), (22.8, -9.539392014))
            Line((22.8, -9.539392014), (23, -9.539392014))
        make_face()
    revolve(axis=Axis((5, 0, 0), (-1, 0, 0)))


solid = part.part
